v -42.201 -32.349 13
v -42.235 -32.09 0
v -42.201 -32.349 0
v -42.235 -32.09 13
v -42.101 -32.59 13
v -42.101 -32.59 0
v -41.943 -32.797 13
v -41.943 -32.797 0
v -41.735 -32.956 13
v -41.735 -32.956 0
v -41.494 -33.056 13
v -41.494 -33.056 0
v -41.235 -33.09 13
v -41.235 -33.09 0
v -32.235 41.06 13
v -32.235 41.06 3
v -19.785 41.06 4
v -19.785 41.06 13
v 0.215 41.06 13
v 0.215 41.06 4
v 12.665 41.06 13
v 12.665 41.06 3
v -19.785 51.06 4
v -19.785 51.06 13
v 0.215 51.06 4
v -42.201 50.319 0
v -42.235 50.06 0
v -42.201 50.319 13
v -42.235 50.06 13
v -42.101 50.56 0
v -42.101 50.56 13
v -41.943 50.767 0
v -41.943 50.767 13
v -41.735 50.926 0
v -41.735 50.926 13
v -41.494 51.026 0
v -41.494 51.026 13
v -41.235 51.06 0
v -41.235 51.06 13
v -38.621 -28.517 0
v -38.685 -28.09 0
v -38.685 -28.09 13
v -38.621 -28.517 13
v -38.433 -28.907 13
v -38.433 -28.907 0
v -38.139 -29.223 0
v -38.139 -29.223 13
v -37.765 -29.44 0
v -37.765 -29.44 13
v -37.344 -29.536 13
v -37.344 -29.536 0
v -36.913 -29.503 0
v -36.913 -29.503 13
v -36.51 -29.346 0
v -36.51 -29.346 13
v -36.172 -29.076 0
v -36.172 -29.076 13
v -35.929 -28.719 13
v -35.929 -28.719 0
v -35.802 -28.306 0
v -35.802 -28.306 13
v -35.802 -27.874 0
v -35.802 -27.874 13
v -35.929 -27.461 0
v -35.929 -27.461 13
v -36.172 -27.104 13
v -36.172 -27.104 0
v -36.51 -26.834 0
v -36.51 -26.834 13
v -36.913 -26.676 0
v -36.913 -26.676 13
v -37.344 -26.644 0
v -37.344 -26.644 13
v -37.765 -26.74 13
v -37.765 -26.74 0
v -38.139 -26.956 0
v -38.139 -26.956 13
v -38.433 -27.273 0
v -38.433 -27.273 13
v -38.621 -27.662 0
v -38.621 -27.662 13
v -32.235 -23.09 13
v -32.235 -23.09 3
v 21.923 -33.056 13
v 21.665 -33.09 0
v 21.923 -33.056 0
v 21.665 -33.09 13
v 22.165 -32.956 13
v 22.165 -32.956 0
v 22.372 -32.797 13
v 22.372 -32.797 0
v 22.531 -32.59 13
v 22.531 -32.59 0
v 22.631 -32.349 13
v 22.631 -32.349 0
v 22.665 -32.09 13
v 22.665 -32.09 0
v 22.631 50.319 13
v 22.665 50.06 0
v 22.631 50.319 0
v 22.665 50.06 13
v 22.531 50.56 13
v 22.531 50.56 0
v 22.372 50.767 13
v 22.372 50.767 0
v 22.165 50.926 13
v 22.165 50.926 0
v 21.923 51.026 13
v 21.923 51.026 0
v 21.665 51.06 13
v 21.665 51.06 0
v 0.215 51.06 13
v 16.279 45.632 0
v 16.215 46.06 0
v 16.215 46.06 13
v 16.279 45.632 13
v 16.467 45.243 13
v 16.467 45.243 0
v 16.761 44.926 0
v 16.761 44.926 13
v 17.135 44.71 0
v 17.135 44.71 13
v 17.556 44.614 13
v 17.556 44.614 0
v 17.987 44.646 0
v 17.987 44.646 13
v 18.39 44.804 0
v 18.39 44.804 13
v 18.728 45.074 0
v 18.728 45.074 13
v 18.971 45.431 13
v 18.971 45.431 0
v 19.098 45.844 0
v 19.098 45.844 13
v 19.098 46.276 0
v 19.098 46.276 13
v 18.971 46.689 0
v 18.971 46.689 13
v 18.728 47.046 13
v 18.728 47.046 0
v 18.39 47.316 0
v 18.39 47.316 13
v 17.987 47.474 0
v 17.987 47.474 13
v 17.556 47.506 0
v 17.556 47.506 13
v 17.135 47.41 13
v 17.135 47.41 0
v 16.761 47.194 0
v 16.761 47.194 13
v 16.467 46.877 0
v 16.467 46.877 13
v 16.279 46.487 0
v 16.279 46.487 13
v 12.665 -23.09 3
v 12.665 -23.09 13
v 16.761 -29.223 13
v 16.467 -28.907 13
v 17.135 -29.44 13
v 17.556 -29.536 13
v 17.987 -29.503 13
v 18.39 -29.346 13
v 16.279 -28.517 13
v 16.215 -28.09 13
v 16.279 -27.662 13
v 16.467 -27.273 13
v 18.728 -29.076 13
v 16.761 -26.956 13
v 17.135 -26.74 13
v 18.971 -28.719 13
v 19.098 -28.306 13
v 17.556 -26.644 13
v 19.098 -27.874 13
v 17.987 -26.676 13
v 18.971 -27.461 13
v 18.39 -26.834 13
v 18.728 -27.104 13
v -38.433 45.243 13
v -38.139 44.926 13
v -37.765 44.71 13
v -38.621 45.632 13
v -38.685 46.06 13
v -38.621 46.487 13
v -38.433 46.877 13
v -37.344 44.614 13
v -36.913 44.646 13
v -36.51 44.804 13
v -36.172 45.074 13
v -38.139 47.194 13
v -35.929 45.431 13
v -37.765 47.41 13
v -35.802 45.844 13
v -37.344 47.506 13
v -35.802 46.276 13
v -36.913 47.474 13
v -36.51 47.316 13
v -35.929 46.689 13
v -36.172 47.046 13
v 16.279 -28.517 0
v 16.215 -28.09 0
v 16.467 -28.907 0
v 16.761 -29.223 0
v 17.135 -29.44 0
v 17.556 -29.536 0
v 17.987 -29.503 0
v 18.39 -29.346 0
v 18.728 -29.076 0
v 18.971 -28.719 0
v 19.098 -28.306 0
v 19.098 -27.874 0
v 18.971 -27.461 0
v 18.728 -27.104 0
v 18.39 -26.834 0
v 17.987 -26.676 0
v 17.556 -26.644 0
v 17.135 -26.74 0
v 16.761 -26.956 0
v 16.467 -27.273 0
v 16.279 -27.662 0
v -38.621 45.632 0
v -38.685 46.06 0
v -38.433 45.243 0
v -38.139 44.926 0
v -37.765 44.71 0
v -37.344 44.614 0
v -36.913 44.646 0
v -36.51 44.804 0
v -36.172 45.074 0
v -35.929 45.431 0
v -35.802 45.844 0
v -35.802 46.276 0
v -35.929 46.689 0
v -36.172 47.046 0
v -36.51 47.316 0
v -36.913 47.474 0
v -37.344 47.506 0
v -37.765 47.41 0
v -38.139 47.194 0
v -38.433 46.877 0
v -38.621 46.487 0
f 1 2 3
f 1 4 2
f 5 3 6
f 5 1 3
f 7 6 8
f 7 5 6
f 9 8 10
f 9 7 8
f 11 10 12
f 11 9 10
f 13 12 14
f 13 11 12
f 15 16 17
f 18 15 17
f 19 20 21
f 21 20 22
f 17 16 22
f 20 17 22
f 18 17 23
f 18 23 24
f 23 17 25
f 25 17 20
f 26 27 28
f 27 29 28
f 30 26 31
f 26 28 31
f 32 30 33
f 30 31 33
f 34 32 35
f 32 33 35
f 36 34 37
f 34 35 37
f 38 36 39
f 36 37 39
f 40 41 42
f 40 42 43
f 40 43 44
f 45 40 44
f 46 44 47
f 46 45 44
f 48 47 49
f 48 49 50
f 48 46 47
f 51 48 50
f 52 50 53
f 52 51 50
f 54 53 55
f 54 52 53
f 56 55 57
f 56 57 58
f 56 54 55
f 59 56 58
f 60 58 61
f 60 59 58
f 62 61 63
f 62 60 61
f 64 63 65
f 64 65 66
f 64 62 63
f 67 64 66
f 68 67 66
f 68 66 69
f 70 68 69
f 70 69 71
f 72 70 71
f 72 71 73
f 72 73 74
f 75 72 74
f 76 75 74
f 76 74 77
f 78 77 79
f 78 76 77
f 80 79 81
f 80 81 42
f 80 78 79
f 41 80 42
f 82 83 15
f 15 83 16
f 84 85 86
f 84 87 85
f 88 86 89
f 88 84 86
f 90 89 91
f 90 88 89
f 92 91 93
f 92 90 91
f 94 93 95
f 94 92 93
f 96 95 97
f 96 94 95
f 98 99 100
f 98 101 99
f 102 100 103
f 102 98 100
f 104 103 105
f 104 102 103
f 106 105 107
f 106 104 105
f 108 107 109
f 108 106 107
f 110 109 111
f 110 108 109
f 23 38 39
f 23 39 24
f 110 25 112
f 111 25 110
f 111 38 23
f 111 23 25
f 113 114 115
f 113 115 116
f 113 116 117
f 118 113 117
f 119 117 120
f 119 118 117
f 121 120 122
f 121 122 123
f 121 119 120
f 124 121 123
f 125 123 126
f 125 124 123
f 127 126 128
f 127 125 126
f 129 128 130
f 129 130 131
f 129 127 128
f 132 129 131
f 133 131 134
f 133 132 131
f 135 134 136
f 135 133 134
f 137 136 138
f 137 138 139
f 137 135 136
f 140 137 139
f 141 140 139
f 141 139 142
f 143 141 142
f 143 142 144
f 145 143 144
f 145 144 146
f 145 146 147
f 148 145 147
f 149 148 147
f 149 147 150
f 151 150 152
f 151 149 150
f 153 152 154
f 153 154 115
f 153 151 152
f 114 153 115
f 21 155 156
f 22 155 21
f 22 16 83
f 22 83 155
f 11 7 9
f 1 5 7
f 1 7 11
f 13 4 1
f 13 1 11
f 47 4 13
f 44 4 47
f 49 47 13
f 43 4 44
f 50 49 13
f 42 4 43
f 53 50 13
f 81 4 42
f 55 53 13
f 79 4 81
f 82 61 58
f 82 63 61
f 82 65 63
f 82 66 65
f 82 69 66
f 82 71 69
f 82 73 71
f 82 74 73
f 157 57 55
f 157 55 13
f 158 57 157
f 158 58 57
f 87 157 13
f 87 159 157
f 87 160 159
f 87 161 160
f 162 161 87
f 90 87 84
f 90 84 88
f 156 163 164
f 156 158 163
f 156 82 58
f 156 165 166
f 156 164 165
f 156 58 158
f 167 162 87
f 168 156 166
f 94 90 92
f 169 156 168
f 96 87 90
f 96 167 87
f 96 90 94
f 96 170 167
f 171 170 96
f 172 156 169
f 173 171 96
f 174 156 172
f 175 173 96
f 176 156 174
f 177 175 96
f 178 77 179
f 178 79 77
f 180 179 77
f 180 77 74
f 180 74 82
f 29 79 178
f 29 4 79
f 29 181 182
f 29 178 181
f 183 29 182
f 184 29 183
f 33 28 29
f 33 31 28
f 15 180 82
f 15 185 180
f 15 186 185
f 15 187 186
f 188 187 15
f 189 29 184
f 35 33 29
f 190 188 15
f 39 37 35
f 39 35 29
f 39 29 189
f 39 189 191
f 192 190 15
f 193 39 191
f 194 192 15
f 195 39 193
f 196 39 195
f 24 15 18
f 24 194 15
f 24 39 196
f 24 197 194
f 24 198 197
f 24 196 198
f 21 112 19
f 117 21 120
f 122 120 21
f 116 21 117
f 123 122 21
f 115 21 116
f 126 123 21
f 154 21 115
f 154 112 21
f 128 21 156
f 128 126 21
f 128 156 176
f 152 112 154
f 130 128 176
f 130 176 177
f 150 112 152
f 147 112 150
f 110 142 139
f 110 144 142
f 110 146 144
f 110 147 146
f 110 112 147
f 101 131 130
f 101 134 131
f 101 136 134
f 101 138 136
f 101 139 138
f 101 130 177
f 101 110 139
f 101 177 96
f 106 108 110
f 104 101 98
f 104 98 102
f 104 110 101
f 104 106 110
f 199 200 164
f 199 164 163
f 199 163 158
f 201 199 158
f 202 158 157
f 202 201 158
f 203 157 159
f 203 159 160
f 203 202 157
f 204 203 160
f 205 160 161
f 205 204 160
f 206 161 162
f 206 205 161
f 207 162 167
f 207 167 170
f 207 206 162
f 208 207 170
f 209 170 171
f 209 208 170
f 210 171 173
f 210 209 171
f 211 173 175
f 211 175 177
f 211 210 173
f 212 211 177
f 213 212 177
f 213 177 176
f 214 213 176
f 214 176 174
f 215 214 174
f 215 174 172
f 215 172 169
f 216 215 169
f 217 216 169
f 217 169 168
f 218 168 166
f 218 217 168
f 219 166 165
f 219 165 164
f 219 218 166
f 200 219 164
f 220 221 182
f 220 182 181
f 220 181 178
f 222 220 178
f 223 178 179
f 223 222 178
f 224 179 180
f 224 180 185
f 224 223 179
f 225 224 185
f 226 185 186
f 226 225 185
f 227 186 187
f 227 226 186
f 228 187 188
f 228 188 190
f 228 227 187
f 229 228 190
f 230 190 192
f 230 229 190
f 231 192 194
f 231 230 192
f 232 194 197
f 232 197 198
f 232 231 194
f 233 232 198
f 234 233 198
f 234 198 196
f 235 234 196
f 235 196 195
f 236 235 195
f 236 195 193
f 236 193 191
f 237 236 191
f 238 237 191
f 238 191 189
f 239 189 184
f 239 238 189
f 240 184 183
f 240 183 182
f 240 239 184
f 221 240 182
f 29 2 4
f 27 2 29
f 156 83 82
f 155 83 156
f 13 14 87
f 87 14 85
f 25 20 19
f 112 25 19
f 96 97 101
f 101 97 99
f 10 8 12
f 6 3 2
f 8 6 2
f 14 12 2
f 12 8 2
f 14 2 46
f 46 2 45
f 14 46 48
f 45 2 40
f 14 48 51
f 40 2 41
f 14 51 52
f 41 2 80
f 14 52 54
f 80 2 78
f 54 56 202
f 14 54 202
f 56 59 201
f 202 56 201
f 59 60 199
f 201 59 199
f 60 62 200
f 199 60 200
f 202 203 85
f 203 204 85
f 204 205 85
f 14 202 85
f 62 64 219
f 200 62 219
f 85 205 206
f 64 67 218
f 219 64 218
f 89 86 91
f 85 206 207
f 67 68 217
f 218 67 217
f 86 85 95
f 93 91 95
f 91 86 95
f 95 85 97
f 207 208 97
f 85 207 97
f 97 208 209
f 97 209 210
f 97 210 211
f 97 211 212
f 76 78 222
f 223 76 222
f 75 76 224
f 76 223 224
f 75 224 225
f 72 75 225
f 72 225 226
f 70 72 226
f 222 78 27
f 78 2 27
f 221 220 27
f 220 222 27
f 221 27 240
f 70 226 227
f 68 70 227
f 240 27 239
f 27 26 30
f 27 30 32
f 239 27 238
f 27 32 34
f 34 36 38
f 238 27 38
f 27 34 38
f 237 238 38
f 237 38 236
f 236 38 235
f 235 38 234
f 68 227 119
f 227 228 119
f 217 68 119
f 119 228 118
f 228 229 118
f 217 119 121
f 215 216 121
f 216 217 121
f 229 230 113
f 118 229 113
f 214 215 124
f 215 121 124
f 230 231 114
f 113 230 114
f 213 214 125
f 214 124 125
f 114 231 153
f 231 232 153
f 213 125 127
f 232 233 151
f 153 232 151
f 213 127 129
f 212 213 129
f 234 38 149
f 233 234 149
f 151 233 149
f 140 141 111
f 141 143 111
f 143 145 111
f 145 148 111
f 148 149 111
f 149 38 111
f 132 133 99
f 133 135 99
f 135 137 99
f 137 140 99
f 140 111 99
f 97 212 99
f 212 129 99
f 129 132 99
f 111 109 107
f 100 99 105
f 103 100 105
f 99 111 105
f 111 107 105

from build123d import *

# Parameters (mm, degrees)
ESQUISSE2_W             = 64.9
ESQUISSE2_H             = 84.149666381
ESQUISSE2_R             = 1.45
ESQUISSE2_W_2           = 44.9
ESQUISSE2_H_2           = 64.15
BOSS_EXTRU_3_DEPTH      = 13
ESQUISSE6_W             = 44.9
ESQUISSE6_H             = 64.15
BOSS_EXTRU_4_DEPTH      = 3
ESQUISSE8_W             = 20
ESQUISSE8_H             = 9
ENL_V_MAT_EXTRU_2_DEPTH = 10
CONG_1_R                = 1
CONG_2_R                = 1
CONG_3_R                = 1
CONG_4_R                = 1


with BuildPart() as part:
    # Esquisse2 → Boss.-Extru.3 (new body)
    with BuildSketch(Plane.XY):
        with Locations((-9.785413718, 8.985039615)):
            Rectangle(ESQUISSE2_W, ESQUISSE2_H)
        with Locations(Location((17.664586282, 46.059872806, 0), (0, 0, 180))):
            Circle(ESQUISSE2_R, mode=Mode.SUBTRACT)
        with Locations(Location((-37.235413718, 46.059872806, 0), (0, 0, 180))):
            Circle(ESQUISSE2_R, mode=Mode.SUBTRACT)
        with Locations(Location((-37.235413718, -28.089793575, 0), (0, 0, 180))):
            Circle(ESQUISSE2_R, mode=Mode.SUBTRACT)
        with Locations(Location((17.664586282, -28.089793575, 0), (0, 0, 180))):
            Circle(ESQUISSE2_R, mode=Mode.SUBTRACT)
        with Locations((-9.785413718, 8.985206425)):
            Rectangle(ESQUISSE2_W_2, ESQUISSE2_H_2, mode=Mode.SUBTRACT)
    extrude(amount=BOSS_EXTRU_3_DEPTH)

    # Esquisse6 → Boss.-Extru.4 (add)
    with BuildSketch(Plane.XY):
        with Locations((-9.785413718, 8.985206425)):
            Rectangle(ESQUISSE6_W, ESQUISSE6_H)
    extrude(amount=BOSS_EXTRU_4_DEPTH)

    # Esquisse8 → Enlèv. mat.-Extru.2 (cut)
    with BuildSketch(Plane.XZ.offset(-41.060206425)):
        with Locations((-9.785413718, 8.5)):
            Rectangle(ESQUISSE8_W, ESQUISSE8_H)
    extrude(amount=-ENL_V_MAT_EXTRU_2_DEPTH, mode=Mode.SUBTRACT)

    # Congé1
    cong_1_edges = [part.edges().sort_by_distance(p)[0] for p in [
        (-42.235413718, 51.059872806, 6.5),
    ]]
    fillet(cong_1_edges, radius=CONG_1_R)

    # Congé2
    cong_2_edges = [part.edges().sort_by_distance(p)[0] for p in [
        (-42.235413718, -33.089793575, 6.5),
    ]]
    fillet(cong_2_edges, radius=CONG_2_R)

    # Congé3
    cong_3_edges = [part.edges().sort_by_distance(p)[0] for p in [
        (22.664586282, -33.089793575, 6.5),
    ]]
    fillet(cong_3_edges, radius=CONG_3_R)

    # Congé4
    cong_4_edges = [part.edges().sort_by_distance(p)[0] for p in [
        (22.664586282, 51.059872806, 6.5),
    ]]
    fillet(cong_4_edges, radius=CONG_4_R)


solid = part.part
